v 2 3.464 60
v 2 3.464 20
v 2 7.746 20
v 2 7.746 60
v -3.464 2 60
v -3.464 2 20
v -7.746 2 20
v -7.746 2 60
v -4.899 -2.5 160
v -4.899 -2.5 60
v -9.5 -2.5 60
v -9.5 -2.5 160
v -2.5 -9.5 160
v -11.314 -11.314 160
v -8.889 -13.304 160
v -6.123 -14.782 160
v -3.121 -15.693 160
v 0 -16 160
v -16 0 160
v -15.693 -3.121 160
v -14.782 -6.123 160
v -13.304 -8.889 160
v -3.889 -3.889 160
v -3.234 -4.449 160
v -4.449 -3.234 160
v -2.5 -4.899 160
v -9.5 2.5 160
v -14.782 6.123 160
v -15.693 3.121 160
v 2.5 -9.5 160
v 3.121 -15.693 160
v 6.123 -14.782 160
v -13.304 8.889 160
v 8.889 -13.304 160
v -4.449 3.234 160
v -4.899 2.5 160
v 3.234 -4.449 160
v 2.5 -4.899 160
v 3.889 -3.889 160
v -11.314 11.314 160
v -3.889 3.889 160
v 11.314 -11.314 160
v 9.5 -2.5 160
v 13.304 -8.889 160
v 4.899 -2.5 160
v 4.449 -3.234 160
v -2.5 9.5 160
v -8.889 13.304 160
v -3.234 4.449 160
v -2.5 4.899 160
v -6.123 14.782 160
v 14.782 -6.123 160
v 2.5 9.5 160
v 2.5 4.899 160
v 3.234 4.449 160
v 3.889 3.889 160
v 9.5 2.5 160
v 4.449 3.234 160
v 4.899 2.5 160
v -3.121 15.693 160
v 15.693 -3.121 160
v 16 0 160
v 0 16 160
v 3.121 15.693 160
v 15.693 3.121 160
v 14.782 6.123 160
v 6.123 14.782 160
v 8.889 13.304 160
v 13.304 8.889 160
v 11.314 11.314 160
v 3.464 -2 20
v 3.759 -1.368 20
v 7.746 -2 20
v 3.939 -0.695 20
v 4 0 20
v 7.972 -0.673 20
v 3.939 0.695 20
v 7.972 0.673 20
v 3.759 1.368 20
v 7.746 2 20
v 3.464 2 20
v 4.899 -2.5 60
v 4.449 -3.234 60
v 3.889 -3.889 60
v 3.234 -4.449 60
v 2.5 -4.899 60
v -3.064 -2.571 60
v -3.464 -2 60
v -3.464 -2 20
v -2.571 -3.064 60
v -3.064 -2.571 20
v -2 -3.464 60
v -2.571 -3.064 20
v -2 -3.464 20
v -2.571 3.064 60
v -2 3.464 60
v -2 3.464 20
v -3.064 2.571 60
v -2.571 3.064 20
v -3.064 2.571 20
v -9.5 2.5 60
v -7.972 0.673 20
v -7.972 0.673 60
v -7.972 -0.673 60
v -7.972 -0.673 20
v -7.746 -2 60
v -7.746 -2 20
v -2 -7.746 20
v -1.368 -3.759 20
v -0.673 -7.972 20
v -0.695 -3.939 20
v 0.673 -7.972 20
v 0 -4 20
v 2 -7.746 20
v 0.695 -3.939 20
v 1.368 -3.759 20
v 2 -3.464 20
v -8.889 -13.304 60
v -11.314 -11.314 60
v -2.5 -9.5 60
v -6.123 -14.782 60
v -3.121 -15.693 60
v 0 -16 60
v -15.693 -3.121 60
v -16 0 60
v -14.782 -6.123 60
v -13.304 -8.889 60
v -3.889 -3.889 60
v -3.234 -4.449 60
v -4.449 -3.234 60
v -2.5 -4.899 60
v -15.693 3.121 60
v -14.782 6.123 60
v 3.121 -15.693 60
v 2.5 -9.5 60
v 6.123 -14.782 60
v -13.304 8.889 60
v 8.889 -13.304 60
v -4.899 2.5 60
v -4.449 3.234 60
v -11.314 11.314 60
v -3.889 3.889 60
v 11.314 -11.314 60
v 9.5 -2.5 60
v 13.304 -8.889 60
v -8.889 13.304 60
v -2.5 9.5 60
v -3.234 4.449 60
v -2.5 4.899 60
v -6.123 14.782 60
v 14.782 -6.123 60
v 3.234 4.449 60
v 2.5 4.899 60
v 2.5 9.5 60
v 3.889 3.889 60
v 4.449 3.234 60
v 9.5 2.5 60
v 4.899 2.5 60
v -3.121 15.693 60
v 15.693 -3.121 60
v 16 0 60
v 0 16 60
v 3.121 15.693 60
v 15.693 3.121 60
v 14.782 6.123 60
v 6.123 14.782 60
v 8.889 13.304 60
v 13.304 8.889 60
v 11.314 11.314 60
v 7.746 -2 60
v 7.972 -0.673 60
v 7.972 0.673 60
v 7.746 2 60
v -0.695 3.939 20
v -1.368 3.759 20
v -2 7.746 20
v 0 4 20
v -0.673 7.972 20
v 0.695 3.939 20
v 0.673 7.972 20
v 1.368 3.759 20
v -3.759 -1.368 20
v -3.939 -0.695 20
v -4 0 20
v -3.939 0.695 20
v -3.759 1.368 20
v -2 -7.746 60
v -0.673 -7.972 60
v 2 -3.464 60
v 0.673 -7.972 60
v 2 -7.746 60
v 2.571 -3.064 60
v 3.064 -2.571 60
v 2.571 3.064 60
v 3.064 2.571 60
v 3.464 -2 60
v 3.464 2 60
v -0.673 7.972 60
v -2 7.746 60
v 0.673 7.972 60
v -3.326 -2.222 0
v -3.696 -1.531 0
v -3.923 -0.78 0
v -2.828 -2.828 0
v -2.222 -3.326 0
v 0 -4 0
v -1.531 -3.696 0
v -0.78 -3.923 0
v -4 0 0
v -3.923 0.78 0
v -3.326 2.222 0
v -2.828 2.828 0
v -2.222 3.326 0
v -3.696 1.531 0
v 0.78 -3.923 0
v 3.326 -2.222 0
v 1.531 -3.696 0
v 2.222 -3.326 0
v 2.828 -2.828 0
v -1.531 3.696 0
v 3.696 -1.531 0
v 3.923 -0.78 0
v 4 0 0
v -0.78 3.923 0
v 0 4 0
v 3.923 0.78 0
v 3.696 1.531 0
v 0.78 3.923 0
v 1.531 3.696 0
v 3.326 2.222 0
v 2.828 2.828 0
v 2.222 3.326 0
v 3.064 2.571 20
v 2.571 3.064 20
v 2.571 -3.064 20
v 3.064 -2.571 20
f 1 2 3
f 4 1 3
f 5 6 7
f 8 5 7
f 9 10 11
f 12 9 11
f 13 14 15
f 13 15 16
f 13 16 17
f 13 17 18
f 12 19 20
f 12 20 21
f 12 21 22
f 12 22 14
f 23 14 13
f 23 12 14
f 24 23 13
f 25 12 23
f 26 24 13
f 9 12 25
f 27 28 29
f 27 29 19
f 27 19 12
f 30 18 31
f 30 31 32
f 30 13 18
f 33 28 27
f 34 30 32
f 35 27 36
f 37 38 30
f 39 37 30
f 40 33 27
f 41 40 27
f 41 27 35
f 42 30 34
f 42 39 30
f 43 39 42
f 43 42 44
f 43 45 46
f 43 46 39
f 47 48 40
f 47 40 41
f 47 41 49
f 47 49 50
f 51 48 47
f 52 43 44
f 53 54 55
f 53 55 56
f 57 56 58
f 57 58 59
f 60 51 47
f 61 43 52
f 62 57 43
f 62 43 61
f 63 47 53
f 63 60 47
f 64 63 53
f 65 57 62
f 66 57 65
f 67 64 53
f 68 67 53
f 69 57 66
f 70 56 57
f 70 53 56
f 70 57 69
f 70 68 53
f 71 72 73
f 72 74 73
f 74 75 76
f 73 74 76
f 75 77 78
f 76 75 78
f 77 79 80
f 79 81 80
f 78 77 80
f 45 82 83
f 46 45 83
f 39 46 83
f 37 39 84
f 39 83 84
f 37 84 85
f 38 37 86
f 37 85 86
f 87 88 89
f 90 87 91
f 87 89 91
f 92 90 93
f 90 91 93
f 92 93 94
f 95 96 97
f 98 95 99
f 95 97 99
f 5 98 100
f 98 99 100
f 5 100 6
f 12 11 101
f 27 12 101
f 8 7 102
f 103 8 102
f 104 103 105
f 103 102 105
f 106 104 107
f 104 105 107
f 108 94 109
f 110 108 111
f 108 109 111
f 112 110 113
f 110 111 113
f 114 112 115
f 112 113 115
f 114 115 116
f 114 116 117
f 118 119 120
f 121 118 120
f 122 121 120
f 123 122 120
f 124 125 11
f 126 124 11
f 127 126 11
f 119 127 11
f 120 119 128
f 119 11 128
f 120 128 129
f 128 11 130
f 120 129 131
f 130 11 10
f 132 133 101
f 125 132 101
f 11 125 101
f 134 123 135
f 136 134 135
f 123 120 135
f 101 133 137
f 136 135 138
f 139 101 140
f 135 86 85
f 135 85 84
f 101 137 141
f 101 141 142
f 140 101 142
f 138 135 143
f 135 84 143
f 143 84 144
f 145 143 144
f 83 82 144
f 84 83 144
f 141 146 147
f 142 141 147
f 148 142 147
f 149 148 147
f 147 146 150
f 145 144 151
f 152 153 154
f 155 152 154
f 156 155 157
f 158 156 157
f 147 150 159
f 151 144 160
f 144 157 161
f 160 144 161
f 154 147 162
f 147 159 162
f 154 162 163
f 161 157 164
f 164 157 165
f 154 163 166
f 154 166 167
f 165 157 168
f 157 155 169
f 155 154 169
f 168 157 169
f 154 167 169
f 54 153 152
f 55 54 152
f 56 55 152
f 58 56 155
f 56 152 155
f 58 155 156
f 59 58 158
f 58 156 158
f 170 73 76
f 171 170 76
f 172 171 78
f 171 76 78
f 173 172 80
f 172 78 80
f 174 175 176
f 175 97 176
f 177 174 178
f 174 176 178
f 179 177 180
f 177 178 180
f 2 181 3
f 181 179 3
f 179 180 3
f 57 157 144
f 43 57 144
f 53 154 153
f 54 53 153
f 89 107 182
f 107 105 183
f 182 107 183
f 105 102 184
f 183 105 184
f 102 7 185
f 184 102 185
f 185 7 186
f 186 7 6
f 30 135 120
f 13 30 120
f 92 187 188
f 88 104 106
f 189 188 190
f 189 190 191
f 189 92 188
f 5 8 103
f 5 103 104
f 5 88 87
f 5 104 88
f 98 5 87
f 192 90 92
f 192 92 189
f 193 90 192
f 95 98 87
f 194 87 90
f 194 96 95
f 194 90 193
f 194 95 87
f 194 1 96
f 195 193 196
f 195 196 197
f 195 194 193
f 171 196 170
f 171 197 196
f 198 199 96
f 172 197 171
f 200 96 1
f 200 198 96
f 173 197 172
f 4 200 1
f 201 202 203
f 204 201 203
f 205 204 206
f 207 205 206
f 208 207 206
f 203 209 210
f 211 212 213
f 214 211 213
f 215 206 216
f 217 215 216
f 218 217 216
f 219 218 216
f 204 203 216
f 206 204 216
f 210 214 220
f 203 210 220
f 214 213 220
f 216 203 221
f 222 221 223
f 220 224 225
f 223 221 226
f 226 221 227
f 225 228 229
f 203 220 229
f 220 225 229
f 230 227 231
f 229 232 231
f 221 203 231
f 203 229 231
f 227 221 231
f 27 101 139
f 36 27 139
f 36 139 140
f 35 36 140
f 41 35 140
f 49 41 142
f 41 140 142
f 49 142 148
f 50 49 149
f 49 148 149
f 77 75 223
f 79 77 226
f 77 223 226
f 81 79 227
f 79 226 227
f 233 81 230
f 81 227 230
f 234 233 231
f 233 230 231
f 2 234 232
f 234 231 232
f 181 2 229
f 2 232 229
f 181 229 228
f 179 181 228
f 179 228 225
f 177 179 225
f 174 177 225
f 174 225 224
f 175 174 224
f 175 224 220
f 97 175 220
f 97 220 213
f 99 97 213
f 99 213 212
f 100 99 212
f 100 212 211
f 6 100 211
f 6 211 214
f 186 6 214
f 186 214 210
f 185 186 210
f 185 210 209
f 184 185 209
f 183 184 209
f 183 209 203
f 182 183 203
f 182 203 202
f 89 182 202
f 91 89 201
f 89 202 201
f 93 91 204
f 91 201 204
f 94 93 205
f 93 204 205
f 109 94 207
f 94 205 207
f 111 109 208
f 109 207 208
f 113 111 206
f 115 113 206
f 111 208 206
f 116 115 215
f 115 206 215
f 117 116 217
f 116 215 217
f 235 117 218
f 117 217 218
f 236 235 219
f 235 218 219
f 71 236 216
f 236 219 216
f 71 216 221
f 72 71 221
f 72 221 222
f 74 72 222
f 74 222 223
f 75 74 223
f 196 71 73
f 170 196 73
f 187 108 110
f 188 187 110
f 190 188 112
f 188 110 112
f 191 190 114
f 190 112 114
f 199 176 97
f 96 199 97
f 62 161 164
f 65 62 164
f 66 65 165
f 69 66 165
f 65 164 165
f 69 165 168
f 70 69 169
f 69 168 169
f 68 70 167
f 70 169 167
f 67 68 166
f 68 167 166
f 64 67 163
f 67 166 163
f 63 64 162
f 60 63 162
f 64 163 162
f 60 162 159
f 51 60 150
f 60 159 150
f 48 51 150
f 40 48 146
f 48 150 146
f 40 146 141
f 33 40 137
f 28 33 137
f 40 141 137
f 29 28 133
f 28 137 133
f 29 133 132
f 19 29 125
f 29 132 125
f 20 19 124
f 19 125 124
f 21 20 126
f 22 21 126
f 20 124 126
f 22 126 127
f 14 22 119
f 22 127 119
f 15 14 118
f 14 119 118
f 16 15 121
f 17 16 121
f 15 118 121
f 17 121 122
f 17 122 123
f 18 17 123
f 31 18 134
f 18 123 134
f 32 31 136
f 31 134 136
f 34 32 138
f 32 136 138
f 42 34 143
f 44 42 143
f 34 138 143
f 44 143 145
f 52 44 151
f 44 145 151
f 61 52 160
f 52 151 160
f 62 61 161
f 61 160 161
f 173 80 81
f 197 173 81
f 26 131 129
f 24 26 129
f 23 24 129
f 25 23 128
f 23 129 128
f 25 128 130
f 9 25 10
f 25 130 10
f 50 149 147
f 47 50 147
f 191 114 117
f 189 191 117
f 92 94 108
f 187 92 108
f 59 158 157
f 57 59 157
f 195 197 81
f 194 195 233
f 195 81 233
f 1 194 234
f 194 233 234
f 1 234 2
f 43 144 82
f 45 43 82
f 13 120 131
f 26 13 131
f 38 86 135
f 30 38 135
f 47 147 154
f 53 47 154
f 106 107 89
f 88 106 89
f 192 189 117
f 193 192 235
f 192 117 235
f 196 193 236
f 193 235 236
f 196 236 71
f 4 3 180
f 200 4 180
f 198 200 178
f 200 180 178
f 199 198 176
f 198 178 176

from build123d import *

# Parameters (mm, degrees)
F0_R     = 4
F1_DEPTH = 20
F4_DEPTH = 40
F6_R     = 16
F7_DEPTH = 100


with BuildPart() as f1:
    # F0 (on Top) → F1 (new body)
    with BuildSketch(Plane.XY):
        Circle(F0_R)
    extrude(amount=F1_DEPTH)

    # F3 (on offset) → F4 (join)
    with BuildSketch(Plane.XY.offset(20)):
        with BuildLine():
            ThreePointArc((-3.4641016151, -2), (-4, 0), (-3.4641016151, 2))
            Line((-3.4641016151, 2), (-7.7459666924, 2))
            ThreePointArc((-7.7459666924, 2), (-8, 0), (-7.7459666924, -2))
            Line((-7.7459666924, -2), (-3.4641016151, -2))
        make_face()
        with BuildLine():
            ThreePointArc((3.4641016151, -2), (3.8637033052, -1.0352761804), (4, 0))
            ThreePointArc((4, 0), (3.8637033052, 1.0352761804), (3.4641016151, 2))
            ThreePointArc((3.4641016151, 2), (2.8284271247, 2.8284271247), (2, 3.4641016151))
            ThreePointArc((2, 3.4641016151), (0, 4), (-2, 3.4641016151))
            ThreePointArc((-2, 3.4641016151), (-2.8284271247, 2.8284271247), (-3.4641016151, 2))
            ThreePointArc((-3.4641016151, 2), (-4, 0), (-3.4641016151, -2))
            ThreePointArc((-3.4641016151, -2), (-2.8284271247, -2.8284271247), (-2, -3.4641016151))
            ThreePointArc((-2, -3.4641016151), (0, -4), (2, -3.4641016151))
            ThreePointArc((2, -3.4641016151), (2.8284271247, -2.8284271247), (3.4641016151, -2))
        make_face()
        with BuildLine():
            ThreePointArc((-2, 3.4641016151), (0, 4), (2, 3.4641016151))
            Line((2, 3.4641016151), (2, 7.7459666924))
            ThreePointArc((2, 7.7459666924), (0, 8), (-2, 7.7459666924))
            Line((-2, 7.7459666924), (-2, 3.4641016151))
        make_face()
        with BuildLine():
            ThreePointArc((3.4641016151, 2), (3.8637033052, 1.0352761804), (4, 0))
            ThreePointArc((4, 0), (3.8637033052, -1.0352761804), (3.4641016151, -2))
            Line((3.4641016151, -2), (7.7459666924, -2))
            ThreePointArc((7.7459666924, -2), (8, 0), (7.7459666924, 2))
            Line((7.7459666924, 2), (3.4641016151, 2))
        make_face()
        with BuildLine():
            Line((2, -7.7459666924), (2, -3.4641016151))
            ThreePointArc((2, -3.4641016151), (0, -4), (-2, -3.4641016151))
            Line((-2, -3.4641016151), (-2, -7.7459666924))
            ThreePointArc((-2, -7.7459666924), (0, -8), (2, -7.7459666924))
        make_face()
    extrude(amount=F4_DEPTH)


with BuildPart() as f7:
    # F6 (on offset) → F7 (new body)
    with BuildSketch(Plane.XY.offset(60)):
        Circle(F6_R)
        with BuildLine():
            ThreePointArc((2.5, 4.8989794856), (3.8890872965, 3.8890872965), (4.8989794856, 2.5))
            Line((4.8989794856, 2.5), (9.5, 2.5))
            Line((9.5, 2.5), (9.5, 0))
            Line((9.5, 0), (9.5, -2.5))
            Line((9.5, -2.5), (4.8989794856, -2.5))
            ThreePointArc((4.8989794856, -2.5), (3.8890872965, -3.8890872965), (2.5, -4.8989794856))
            Line((2.5, -4.8989794856), (2.5, -9.5))
            Line((2.5, -9.5), (0, -9.5))
            Line((0, -9.5), (-2.5, -9.5))
            Line((-2.5, -9.5), (-2.5, -4.8989794856))
            ThreePointArc((-2.5, -4.8989794856), (-3.8890872965, -3.8890872965), (-4.8989794856, -2.5))
            Line((-4.8989794856, -2.5), (-9.5, -2.5))
            Line((-9.5, -2.5), (-9.5, 0))
            Line((-9.5, 0), (-9.5, 2.5))
            Line((-9.5, 2.5), (-4.8989794856, 2.5))
            ThreePointArc((-4.8989794856, 2.5), (-3.8890872965, 3.8890872965), (-2.5, 4.8989794856))
            Line((-2.5, 4.8989794856), (-2.5, 9.5))
            Line((-2.5, 9.5), (0, 9.5))
            Line((0, 9.5), (2.5, 9.5))
            Line((2.5, 9.5), (2.5, 4.8989794856))
        make_face(mode=Mode.SUBTRACT)
    extrude(amount=F7_DEPTH)


solid = Compound([f1.part, f7.part])
